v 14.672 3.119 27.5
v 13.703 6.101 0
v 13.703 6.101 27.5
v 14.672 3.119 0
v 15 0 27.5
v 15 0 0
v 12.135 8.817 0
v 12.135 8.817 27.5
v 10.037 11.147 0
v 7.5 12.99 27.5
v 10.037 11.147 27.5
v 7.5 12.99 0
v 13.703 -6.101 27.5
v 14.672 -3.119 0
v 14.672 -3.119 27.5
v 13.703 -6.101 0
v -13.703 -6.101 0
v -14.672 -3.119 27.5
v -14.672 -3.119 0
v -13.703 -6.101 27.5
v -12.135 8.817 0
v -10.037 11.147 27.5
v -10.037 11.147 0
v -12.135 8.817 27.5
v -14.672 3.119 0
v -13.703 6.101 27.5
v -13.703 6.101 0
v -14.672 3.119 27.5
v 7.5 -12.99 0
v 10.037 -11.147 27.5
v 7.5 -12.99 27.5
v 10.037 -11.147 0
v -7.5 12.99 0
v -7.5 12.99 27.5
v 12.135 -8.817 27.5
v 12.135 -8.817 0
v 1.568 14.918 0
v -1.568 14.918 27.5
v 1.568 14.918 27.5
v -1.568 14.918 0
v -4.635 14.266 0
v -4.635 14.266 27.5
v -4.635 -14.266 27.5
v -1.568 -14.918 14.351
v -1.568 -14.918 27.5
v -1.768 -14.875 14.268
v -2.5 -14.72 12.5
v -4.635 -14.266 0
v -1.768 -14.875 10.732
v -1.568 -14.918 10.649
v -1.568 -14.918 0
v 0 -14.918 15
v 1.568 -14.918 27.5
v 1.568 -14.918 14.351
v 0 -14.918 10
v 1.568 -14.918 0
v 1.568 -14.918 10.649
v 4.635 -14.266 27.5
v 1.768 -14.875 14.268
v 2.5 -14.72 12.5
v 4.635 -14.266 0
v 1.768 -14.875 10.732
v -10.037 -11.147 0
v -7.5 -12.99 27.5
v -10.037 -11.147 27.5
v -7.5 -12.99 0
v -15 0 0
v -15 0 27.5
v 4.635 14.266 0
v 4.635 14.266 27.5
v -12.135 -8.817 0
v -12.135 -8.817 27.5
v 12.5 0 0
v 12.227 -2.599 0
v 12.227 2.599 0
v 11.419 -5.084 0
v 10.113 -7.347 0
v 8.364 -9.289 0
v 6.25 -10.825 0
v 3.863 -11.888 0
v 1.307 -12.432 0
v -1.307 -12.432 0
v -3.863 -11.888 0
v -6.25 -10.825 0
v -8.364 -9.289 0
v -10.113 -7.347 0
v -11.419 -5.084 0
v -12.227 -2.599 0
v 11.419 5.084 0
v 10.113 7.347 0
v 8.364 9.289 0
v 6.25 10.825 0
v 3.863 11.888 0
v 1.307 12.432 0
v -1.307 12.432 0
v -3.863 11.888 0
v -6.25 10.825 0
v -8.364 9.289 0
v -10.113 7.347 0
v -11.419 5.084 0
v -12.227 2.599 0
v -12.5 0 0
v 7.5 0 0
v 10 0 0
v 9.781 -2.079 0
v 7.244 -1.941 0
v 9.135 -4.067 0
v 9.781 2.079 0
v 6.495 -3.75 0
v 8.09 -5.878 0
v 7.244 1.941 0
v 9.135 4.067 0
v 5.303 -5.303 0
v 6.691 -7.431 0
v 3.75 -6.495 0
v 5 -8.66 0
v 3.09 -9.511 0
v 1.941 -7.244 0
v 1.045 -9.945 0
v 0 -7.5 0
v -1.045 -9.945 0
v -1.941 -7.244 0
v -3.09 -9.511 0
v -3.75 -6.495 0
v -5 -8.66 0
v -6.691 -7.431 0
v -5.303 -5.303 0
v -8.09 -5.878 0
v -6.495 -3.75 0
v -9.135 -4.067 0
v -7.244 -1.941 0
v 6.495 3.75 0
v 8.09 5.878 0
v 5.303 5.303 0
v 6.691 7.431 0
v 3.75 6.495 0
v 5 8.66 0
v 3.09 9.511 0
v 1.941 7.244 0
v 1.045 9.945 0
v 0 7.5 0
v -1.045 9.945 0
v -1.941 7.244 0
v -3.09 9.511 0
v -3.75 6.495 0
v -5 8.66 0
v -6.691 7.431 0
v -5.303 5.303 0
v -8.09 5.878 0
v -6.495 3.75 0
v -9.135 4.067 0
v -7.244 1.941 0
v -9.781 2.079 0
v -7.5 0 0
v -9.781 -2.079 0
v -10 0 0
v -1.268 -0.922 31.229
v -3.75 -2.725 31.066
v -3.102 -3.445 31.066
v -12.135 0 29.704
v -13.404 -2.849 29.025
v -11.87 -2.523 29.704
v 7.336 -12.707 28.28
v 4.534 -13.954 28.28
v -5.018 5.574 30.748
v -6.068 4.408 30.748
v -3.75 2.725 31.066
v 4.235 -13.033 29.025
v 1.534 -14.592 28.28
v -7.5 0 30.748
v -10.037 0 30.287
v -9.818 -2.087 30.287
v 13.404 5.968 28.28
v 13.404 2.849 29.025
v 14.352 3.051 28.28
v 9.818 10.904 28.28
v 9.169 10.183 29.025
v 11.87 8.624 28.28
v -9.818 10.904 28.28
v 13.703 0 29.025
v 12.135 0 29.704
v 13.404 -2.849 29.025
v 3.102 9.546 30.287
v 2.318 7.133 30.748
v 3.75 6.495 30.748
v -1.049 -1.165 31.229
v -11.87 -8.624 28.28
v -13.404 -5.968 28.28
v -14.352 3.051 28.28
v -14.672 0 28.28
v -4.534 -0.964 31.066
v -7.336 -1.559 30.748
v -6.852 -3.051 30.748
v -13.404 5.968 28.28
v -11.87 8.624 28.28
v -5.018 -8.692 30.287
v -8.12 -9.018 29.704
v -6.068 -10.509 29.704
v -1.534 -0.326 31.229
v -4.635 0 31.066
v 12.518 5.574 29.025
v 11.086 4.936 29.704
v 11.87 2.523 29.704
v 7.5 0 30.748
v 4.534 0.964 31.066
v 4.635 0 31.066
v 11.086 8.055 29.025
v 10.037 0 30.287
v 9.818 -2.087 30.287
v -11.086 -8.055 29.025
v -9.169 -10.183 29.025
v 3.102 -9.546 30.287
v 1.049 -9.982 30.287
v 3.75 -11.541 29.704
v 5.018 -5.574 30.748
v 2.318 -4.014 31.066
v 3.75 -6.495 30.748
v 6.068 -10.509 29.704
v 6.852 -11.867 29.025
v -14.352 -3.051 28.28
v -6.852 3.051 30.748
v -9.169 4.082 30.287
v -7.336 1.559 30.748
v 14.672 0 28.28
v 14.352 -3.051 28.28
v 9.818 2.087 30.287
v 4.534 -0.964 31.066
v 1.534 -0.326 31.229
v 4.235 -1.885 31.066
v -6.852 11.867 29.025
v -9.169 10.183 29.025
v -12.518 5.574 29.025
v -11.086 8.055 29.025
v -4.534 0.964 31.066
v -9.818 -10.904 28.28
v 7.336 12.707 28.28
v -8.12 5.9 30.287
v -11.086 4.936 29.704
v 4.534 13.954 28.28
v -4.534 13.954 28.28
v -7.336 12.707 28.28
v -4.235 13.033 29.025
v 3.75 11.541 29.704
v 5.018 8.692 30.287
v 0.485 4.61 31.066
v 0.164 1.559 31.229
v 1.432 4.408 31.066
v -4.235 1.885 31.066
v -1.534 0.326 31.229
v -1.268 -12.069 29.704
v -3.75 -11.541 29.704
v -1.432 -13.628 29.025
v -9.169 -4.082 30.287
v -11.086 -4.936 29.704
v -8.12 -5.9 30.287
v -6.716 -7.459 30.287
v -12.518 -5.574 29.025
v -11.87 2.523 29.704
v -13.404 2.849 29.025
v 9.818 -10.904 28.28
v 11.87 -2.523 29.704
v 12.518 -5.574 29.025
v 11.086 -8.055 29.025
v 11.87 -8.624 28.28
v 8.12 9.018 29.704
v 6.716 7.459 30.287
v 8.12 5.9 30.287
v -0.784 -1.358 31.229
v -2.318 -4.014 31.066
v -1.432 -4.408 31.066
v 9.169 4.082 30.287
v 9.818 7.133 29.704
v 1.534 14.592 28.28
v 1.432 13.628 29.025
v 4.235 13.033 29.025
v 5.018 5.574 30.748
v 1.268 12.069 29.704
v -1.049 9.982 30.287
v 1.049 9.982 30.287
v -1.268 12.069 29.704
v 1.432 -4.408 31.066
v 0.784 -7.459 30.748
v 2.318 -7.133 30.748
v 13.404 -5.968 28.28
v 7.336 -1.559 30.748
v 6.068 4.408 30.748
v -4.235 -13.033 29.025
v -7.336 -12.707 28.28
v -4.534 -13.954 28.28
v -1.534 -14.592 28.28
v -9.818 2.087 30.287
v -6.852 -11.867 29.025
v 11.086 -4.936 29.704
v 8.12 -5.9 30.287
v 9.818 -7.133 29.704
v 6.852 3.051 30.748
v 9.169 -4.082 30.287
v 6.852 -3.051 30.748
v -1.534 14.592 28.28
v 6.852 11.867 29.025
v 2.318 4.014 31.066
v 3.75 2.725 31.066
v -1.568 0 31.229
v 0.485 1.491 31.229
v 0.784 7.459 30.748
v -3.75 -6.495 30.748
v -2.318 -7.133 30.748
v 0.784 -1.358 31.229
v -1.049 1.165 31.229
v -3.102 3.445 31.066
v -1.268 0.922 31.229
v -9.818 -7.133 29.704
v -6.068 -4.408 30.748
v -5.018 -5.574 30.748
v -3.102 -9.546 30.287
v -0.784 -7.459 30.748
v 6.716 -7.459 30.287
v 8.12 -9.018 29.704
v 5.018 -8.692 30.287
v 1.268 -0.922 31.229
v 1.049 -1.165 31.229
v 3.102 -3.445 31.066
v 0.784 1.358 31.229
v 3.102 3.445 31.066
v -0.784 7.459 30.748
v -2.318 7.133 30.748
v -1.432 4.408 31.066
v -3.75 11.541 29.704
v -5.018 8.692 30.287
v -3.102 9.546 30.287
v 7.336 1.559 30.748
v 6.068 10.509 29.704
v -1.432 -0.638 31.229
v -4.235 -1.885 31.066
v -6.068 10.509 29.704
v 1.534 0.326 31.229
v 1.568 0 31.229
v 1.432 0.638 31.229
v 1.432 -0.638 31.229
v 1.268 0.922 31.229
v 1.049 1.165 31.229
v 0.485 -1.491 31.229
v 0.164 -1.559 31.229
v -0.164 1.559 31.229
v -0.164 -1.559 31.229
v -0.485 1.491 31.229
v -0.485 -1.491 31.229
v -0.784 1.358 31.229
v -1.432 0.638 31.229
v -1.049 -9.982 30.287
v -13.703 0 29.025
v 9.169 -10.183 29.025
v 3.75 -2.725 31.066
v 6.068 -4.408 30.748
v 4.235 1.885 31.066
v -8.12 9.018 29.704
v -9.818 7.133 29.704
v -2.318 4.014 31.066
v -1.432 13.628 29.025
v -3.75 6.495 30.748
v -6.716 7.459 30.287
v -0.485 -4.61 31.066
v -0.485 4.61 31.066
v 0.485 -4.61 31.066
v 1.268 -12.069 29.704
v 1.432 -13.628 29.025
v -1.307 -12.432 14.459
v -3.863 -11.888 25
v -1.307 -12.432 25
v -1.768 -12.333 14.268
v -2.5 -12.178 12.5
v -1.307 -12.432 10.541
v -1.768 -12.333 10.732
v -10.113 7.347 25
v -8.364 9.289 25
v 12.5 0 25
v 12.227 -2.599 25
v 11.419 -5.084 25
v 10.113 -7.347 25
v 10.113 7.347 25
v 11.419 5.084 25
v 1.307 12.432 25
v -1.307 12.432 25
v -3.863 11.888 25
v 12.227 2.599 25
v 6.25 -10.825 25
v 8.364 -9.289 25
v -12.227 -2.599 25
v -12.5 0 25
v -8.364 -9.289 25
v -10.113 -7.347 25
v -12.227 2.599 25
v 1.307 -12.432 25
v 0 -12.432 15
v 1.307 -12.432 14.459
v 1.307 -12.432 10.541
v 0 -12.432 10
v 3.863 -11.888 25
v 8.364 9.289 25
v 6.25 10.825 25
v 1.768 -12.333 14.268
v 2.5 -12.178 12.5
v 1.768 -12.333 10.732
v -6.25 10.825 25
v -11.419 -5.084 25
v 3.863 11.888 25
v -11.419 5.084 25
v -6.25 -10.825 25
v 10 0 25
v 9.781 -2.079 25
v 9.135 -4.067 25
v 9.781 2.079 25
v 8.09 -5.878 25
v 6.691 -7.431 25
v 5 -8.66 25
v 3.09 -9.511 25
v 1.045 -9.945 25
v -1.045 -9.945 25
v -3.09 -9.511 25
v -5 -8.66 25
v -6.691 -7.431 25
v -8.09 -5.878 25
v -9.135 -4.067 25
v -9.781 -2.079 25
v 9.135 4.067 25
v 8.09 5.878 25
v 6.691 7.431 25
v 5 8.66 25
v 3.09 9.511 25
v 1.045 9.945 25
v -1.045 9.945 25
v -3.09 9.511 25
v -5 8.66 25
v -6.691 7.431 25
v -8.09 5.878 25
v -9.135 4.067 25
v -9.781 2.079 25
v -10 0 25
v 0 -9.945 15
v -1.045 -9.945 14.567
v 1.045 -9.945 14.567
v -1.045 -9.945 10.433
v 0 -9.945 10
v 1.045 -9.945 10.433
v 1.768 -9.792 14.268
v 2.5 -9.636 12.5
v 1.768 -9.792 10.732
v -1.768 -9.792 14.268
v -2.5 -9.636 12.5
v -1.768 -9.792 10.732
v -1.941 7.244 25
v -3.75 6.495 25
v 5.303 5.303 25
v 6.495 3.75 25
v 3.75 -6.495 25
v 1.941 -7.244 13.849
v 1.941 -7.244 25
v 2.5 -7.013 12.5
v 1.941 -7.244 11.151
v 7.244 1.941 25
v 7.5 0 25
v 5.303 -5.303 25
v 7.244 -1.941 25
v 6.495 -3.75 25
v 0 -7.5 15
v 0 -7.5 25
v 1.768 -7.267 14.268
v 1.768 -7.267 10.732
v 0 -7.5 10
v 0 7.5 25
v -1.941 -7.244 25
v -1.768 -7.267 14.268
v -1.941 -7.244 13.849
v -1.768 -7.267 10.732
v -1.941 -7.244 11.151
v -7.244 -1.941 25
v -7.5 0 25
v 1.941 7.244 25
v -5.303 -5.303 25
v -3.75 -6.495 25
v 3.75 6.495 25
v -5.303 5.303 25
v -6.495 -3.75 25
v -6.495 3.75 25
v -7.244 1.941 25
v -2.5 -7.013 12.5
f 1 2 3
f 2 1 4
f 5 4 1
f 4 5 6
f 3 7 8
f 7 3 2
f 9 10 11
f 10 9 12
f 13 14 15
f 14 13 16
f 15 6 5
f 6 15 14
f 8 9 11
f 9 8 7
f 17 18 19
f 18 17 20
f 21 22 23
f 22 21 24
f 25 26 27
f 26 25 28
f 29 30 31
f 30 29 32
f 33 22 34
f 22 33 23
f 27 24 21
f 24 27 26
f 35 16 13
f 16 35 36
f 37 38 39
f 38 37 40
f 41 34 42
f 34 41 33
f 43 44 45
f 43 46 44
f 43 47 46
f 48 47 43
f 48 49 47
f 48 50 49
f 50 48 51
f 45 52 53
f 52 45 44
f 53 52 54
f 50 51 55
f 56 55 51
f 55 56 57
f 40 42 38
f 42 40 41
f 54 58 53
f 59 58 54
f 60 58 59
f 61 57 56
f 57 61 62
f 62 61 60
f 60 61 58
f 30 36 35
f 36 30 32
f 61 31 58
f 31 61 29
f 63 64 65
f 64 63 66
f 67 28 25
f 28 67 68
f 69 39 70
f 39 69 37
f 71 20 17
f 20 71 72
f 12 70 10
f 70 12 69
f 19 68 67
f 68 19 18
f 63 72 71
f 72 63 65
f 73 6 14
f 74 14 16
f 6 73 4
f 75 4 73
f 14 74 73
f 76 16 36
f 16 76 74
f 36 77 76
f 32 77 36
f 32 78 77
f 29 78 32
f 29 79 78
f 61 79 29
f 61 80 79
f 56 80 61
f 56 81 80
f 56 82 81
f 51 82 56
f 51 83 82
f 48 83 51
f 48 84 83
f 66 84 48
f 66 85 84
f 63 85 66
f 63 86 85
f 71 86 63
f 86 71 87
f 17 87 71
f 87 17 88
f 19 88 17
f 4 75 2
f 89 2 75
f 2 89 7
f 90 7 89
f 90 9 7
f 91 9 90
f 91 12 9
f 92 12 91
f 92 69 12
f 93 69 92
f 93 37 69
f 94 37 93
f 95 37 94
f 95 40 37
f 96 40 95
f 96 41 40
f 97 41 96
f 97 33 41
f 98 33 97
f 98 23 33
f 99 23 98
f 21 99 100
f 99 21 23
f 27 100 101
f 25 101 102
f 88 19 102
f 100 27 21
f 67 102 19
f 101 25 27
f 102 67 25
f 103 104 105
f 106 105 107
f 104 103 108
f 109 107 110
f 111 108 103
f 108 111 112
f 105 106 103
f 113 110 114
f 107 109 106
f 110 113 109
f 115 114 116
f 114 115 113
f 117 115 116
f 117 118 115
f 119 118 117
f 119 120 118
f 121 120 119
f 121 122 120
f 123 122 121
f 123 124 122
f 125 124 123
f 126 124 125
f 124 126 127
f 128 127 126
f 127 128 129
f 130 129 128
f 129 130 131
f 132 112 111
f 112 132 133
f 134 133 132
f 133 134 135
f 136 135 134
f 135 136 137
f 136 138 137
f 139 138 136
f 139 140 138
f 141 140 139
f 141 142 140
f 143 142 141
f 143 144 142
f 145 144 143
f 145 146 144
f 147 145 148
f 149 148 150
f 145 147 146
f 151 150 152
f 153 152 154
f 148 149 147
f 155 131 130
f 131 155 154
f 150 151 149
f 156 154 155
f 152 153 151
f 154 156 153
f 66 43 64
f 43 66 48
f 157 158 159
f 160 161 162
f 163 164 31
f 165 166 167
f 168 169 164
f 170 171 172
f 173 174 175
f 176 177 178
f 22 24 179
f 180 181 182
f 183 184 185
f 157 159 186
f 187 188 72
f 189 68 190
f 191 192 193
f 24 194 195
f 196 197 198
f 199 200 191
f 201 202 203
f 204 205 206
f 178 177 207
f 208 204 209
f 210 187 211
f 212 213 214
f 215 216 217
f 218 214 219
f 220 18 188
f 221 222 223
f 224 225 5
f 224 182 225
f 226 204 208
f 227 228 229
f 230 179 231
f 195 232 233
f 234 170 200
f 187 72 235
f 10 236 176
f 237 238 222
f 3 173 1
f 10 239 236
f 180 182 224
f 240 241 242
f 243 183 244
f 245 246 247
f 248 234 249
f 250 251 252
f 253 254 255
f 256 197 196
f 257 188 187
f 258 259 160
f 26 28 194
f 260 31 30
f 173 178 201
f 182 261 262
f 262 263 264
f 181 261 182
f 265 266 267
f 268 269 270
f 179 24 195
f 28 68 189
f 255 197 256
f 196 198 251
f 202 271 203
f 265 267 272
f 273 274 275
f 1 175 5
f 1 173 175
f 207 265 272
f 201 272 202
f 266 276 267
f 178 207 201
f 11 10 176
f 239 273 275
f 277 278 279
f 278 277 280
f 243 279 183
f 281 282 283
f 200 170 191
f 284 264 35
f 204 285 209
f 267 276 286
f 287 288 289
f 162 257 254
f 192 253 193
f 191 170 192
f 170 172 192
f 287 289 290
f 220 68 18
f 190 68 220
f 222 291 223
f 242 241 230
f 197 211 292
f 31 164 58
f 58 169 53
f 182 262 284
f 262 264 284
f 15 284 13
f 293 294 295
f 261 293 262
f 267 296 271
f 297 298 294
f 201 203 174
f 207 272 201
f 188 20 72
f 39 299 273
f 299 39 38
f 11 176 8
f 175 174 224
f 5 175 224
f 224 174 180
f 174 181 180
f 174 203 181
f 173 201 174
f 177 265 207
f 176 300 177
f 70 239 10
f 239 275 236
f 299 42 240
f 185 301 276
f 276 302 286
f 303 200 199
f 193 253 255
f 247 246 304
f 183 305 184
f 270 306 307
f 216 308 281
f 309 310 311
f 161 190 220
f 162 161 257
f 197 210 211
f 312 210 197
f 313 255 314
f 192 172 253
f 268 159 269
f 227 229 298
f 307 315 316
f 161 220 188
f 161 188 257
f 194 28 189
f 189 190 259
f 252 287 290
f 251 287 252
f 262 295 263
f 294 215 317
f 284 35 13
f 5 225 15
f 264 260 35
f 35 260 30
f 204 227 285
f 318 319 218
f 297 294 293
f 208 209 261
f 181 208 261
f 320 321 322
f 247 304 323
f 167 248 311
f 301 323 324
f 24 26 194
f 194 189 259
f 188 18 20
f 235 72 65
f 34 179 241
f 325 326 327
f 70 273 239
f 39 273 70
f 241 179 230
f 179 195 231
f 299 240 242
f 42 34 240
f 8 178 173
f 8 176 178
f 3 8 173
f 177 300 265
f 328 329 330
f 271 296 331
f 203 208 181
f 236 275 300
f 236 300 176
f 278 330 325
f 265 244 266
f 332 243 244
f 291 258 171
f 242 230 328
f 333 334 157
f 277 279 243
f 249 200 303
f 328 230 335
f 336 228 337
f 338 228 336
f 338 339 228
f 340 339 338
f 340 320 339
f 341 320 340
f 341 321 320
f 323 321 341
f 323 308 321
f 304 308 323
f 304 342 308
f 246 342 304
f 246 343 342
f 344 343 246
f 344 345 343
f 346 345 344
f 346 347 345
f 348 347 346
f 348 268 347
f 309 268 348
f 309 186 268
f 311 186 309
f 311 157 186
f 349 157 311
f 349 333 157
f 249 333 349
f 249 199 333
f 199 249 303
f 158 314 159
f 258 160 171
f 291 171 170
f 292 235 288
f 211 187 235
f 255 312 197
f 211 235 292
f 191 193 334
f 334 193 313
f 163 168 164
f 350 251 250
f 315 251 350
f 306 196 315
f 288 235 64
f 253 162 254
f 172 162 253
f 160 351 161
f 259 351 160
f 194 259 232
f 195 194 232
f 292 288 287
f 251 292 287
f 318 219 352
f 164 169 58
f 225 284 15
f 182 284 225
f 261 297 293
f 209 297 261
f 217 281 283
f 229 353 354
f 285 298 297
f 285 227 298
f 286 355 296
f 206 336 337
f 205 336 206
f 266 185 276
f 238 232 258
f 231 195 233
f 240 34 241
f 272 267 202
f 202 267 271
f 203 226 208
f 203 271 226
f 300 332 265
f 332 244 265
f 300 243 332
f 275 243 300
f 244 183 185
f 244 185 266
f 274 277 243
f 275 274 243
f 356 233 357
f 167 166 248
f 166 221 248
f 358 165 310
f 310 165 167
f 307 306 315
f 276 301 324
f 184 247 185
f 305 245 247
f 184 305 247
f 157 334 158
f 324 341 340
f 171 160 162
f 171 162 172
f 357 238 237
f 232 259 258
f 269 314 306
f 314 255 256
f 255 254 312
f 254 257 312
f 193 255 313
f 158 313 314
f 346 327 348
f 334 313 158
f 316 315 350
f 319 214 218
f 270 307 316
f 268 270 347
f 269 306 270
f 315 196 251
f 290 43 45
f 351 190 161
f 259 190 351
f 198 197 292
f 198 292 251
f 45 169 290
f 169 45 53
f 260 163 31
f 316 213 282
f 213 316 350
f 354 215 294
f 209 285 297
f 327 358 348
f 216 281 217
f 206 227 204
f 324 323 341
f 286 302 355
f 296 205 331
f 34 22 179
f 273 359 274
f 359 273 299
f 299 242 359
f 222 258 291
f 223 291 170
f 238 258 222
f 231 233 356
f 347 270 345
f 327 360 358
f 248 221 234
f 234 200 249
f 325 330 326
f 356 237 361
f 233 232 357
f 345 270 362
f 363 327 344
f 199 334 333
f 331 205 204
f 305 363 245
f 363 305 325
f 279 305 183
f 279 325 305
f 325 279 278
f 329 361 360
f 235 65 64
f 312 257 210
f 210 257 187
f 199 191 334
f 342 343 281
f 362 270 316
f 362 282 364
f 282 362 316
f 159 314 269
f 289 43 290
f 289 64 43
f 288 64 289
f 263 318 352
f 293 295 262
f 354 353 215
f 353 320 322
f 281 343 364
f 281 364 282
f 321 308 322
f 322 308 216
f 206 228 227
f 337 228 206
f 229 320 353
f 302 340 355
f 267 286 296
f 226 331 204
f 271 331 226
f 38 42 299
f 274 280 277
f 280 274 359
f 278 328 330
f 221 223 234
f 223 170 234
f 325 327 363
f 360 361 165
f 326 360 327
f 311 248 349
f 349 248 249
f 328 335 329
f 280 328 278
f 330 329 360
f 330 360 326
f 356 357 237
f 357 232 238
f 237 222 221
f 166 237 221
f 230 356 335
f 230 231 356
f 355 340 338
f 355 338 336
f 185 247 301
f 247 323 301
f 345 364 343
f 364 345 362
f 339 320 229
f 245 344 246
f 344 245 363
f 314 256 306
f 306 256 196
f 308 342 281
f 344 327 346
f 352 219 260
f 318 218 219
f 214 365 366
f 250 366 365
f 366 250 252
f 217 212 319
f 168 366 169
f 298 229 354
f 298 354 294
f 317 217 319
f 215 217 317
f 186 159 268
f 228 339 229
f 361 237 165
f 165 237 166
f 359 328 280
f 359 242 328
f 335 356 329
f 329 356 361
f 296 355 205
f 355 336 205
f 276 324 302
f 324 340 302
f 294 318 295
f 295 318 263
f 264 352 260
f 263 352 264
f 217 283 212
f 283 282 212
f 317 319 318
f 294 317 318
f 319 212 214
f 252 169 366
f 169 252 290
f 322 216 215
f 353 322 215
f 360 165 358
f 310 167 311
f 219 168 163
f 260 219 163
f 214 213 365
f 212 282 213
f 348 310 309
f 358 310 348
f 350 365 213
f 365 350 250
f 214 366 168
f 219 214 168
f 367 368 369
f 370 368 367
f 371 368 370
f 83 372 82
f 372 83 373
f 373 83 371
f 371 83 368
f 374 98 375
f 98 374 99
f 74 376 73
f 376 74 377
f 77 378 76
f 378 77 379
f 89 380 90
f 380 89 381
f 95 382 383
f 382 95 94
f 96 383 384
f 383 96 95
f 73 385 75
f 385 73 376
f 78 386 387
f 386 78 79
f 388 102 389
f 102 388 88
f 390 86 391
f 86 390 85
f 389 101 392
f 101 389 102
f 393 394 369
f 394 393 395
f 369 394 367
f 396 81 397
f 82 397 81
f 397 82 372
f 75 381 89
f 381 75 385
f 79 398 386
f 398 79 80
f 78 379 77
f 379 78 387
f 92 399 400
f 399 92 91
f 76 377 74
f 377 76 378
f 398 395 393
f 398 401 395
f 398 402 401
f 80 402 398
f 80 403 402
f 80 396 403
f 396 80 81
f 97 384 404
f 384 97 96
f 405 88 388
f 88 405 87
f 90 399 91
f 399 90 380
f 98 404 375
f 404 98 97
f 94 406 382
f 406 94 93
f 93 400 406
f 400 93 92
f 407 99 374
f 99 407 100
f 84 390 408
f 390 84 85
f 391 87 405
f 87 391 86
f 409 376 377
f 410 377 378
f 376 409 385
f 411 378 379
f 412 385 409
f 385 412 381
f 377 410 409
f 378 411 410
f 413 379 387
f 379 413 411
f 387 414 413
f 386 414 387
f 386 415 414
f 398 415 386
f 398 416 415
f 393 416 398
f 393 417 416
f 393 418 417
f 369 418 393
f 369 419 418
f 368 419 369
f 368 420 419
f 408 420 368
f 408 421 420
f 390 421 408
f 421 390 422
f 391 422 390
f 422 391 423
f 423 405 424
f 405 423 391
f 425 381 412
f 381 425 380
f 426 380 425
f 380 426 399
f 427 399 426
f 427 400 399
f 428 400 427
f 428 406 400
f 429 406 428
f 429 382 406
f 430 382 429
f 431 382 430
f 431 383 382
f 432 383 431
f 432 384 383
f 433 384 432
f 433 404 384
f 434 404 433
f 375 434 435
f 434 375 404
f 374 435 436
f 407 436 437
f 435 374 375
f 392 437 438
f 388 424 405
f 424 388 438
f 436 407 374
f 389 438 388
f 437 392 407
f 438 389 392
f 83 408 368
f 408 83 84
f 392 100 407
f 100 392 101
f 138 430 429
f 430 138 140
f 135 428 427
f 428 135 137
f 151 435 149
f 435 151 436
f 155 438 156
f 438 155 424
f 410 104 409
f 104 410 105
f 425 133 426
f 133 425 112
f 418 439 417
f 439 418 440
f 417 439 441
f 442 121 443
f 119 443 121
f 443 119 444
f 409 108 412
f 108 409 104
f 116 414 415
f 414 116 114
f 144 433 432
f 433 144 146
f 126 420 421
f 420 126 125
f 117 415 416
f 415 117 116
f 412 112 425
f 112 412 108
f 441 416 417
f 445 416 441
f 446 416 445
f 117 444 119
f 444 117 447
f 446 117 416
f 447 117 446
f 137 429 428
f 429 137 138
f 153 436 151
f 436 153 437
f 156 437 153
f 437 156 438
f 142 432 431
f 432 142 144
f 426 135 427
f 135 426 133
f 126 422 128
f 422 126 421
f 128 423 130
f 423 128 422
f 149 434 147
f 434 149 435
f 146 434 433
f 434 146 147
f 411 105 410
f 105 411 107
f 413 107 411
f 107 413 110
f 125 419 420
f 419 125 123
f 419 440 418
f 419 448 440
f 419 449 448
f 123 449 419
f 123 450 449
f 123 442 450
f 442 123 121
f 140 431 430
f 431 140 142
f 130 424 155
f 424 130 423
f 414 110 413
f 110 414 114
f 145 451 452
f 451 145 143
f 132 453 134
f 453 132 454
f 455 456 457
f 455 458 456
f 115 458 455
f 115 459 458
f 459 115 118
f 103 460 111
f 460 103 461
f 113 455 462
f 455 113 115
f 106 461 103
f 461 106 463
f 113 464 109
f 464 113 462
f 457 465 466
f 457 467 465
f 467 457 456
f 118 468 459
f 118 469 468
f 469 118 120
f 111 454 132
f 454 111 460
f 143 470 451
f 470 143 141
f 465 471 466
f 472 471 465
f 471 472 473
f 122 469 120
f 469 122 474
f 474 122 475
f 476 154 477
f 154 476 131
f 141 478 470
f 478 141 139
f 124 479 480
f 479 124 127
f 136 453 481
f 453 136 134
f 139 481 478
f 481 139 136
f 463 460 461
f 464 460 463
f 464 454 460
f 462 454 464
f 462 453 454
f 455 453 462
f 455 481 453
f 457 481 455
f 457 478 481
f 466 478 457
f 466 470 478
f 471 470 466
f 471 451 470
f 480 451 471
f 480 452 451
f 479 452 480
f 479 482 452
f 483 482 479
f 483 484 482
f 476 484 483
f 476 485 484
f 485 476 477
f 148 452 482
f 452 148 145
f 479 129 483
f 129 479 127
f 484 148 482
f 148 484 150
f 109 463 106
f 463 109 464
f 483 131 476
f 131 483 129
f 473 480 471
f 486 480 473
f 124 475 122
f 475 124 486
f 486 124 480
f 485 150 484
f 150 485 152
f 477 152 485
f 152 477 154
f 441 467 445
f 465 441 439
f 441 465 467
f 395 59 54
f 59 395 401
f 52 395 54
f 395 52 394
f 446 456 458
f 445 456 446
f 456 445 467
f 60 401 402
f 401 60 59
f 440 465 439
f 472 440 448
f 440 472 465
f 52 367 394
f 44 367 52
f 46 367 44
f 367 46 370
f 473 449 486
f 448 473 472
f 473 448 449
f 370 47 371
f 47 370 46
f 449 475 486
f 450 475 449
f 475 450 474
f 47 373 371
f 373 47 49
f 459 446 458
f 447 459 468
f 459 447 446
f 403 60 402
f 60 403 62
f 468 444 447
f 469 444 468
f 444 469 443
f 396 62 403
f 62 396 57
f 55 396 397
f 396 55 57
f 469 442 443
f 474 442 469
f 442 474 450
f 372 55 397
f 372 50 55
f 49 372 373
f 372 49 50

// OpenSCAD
// [FL_INDEX: keywords="openscad, 3d_parametric, Endcap_for_Pipe_or_Rod, csg_solid" | COT="Parametric OpenSCAD design from 3DCodeverse"]
// Title: Endcap for Pipe or Rod

// Pipe or Rod Endcap
// (c) 2013, Christopher "ScribbleJ" Jansen

// Pipe or Rod Outer Diameter
pipe_outer_d = 25;
// Pipe Inner Diameter -- Set to 0 for Rod
pipe_inner_d = 20;
// Minimum Thickness of Part
cap_thickness = 2.5;
// Roundness of Endcap -- Set 0 for Flat, 1 for Sphere, in-between for rounded.
cap_roundness = 0.25;
// Length of Endcap along Pipe or Rod
cap_length = 25;

// Number of Setscrew Holes -- 0 for None
setscrew_num = 1;
// Diameter of Setscrew Holes
setscrew_d = 5;


difference()
{
  union()
  {
    cylinder(r=pipe_outer_d/2 + cap_thickness, h=cap_length + cap_thickness);
    if(cap_roundness > 0)
    {
      translate([0,0,cap_length + cap_thickness]) scale([1,1,cap_roundness]) sphere(r=pipe_outer_d/2 + cap_thickness);
    }
  }

  translate([0,0,-1])
  {
    cylinder(r=pipe_inner_d/2 - cap_thickness, h=cap_length+1);
  
    difference()
    {
      cylinder(r=pipe_outer_d/2, h=cap_length+1);
      cylinder(r=pipe_inner_d/2, h=cap_length+1);
    }
  }

  if(setscrew_num > 0)
  {
    for(x=[0:360/setscrew_num:setscrew_num*(360/setscrew_num)])
    {
      translate([0,0,cap_length/2]) rotate([90,0,x]) cylinder(r=setscrew_d/2, h=pipe_outer_d);
    }
  }
}
